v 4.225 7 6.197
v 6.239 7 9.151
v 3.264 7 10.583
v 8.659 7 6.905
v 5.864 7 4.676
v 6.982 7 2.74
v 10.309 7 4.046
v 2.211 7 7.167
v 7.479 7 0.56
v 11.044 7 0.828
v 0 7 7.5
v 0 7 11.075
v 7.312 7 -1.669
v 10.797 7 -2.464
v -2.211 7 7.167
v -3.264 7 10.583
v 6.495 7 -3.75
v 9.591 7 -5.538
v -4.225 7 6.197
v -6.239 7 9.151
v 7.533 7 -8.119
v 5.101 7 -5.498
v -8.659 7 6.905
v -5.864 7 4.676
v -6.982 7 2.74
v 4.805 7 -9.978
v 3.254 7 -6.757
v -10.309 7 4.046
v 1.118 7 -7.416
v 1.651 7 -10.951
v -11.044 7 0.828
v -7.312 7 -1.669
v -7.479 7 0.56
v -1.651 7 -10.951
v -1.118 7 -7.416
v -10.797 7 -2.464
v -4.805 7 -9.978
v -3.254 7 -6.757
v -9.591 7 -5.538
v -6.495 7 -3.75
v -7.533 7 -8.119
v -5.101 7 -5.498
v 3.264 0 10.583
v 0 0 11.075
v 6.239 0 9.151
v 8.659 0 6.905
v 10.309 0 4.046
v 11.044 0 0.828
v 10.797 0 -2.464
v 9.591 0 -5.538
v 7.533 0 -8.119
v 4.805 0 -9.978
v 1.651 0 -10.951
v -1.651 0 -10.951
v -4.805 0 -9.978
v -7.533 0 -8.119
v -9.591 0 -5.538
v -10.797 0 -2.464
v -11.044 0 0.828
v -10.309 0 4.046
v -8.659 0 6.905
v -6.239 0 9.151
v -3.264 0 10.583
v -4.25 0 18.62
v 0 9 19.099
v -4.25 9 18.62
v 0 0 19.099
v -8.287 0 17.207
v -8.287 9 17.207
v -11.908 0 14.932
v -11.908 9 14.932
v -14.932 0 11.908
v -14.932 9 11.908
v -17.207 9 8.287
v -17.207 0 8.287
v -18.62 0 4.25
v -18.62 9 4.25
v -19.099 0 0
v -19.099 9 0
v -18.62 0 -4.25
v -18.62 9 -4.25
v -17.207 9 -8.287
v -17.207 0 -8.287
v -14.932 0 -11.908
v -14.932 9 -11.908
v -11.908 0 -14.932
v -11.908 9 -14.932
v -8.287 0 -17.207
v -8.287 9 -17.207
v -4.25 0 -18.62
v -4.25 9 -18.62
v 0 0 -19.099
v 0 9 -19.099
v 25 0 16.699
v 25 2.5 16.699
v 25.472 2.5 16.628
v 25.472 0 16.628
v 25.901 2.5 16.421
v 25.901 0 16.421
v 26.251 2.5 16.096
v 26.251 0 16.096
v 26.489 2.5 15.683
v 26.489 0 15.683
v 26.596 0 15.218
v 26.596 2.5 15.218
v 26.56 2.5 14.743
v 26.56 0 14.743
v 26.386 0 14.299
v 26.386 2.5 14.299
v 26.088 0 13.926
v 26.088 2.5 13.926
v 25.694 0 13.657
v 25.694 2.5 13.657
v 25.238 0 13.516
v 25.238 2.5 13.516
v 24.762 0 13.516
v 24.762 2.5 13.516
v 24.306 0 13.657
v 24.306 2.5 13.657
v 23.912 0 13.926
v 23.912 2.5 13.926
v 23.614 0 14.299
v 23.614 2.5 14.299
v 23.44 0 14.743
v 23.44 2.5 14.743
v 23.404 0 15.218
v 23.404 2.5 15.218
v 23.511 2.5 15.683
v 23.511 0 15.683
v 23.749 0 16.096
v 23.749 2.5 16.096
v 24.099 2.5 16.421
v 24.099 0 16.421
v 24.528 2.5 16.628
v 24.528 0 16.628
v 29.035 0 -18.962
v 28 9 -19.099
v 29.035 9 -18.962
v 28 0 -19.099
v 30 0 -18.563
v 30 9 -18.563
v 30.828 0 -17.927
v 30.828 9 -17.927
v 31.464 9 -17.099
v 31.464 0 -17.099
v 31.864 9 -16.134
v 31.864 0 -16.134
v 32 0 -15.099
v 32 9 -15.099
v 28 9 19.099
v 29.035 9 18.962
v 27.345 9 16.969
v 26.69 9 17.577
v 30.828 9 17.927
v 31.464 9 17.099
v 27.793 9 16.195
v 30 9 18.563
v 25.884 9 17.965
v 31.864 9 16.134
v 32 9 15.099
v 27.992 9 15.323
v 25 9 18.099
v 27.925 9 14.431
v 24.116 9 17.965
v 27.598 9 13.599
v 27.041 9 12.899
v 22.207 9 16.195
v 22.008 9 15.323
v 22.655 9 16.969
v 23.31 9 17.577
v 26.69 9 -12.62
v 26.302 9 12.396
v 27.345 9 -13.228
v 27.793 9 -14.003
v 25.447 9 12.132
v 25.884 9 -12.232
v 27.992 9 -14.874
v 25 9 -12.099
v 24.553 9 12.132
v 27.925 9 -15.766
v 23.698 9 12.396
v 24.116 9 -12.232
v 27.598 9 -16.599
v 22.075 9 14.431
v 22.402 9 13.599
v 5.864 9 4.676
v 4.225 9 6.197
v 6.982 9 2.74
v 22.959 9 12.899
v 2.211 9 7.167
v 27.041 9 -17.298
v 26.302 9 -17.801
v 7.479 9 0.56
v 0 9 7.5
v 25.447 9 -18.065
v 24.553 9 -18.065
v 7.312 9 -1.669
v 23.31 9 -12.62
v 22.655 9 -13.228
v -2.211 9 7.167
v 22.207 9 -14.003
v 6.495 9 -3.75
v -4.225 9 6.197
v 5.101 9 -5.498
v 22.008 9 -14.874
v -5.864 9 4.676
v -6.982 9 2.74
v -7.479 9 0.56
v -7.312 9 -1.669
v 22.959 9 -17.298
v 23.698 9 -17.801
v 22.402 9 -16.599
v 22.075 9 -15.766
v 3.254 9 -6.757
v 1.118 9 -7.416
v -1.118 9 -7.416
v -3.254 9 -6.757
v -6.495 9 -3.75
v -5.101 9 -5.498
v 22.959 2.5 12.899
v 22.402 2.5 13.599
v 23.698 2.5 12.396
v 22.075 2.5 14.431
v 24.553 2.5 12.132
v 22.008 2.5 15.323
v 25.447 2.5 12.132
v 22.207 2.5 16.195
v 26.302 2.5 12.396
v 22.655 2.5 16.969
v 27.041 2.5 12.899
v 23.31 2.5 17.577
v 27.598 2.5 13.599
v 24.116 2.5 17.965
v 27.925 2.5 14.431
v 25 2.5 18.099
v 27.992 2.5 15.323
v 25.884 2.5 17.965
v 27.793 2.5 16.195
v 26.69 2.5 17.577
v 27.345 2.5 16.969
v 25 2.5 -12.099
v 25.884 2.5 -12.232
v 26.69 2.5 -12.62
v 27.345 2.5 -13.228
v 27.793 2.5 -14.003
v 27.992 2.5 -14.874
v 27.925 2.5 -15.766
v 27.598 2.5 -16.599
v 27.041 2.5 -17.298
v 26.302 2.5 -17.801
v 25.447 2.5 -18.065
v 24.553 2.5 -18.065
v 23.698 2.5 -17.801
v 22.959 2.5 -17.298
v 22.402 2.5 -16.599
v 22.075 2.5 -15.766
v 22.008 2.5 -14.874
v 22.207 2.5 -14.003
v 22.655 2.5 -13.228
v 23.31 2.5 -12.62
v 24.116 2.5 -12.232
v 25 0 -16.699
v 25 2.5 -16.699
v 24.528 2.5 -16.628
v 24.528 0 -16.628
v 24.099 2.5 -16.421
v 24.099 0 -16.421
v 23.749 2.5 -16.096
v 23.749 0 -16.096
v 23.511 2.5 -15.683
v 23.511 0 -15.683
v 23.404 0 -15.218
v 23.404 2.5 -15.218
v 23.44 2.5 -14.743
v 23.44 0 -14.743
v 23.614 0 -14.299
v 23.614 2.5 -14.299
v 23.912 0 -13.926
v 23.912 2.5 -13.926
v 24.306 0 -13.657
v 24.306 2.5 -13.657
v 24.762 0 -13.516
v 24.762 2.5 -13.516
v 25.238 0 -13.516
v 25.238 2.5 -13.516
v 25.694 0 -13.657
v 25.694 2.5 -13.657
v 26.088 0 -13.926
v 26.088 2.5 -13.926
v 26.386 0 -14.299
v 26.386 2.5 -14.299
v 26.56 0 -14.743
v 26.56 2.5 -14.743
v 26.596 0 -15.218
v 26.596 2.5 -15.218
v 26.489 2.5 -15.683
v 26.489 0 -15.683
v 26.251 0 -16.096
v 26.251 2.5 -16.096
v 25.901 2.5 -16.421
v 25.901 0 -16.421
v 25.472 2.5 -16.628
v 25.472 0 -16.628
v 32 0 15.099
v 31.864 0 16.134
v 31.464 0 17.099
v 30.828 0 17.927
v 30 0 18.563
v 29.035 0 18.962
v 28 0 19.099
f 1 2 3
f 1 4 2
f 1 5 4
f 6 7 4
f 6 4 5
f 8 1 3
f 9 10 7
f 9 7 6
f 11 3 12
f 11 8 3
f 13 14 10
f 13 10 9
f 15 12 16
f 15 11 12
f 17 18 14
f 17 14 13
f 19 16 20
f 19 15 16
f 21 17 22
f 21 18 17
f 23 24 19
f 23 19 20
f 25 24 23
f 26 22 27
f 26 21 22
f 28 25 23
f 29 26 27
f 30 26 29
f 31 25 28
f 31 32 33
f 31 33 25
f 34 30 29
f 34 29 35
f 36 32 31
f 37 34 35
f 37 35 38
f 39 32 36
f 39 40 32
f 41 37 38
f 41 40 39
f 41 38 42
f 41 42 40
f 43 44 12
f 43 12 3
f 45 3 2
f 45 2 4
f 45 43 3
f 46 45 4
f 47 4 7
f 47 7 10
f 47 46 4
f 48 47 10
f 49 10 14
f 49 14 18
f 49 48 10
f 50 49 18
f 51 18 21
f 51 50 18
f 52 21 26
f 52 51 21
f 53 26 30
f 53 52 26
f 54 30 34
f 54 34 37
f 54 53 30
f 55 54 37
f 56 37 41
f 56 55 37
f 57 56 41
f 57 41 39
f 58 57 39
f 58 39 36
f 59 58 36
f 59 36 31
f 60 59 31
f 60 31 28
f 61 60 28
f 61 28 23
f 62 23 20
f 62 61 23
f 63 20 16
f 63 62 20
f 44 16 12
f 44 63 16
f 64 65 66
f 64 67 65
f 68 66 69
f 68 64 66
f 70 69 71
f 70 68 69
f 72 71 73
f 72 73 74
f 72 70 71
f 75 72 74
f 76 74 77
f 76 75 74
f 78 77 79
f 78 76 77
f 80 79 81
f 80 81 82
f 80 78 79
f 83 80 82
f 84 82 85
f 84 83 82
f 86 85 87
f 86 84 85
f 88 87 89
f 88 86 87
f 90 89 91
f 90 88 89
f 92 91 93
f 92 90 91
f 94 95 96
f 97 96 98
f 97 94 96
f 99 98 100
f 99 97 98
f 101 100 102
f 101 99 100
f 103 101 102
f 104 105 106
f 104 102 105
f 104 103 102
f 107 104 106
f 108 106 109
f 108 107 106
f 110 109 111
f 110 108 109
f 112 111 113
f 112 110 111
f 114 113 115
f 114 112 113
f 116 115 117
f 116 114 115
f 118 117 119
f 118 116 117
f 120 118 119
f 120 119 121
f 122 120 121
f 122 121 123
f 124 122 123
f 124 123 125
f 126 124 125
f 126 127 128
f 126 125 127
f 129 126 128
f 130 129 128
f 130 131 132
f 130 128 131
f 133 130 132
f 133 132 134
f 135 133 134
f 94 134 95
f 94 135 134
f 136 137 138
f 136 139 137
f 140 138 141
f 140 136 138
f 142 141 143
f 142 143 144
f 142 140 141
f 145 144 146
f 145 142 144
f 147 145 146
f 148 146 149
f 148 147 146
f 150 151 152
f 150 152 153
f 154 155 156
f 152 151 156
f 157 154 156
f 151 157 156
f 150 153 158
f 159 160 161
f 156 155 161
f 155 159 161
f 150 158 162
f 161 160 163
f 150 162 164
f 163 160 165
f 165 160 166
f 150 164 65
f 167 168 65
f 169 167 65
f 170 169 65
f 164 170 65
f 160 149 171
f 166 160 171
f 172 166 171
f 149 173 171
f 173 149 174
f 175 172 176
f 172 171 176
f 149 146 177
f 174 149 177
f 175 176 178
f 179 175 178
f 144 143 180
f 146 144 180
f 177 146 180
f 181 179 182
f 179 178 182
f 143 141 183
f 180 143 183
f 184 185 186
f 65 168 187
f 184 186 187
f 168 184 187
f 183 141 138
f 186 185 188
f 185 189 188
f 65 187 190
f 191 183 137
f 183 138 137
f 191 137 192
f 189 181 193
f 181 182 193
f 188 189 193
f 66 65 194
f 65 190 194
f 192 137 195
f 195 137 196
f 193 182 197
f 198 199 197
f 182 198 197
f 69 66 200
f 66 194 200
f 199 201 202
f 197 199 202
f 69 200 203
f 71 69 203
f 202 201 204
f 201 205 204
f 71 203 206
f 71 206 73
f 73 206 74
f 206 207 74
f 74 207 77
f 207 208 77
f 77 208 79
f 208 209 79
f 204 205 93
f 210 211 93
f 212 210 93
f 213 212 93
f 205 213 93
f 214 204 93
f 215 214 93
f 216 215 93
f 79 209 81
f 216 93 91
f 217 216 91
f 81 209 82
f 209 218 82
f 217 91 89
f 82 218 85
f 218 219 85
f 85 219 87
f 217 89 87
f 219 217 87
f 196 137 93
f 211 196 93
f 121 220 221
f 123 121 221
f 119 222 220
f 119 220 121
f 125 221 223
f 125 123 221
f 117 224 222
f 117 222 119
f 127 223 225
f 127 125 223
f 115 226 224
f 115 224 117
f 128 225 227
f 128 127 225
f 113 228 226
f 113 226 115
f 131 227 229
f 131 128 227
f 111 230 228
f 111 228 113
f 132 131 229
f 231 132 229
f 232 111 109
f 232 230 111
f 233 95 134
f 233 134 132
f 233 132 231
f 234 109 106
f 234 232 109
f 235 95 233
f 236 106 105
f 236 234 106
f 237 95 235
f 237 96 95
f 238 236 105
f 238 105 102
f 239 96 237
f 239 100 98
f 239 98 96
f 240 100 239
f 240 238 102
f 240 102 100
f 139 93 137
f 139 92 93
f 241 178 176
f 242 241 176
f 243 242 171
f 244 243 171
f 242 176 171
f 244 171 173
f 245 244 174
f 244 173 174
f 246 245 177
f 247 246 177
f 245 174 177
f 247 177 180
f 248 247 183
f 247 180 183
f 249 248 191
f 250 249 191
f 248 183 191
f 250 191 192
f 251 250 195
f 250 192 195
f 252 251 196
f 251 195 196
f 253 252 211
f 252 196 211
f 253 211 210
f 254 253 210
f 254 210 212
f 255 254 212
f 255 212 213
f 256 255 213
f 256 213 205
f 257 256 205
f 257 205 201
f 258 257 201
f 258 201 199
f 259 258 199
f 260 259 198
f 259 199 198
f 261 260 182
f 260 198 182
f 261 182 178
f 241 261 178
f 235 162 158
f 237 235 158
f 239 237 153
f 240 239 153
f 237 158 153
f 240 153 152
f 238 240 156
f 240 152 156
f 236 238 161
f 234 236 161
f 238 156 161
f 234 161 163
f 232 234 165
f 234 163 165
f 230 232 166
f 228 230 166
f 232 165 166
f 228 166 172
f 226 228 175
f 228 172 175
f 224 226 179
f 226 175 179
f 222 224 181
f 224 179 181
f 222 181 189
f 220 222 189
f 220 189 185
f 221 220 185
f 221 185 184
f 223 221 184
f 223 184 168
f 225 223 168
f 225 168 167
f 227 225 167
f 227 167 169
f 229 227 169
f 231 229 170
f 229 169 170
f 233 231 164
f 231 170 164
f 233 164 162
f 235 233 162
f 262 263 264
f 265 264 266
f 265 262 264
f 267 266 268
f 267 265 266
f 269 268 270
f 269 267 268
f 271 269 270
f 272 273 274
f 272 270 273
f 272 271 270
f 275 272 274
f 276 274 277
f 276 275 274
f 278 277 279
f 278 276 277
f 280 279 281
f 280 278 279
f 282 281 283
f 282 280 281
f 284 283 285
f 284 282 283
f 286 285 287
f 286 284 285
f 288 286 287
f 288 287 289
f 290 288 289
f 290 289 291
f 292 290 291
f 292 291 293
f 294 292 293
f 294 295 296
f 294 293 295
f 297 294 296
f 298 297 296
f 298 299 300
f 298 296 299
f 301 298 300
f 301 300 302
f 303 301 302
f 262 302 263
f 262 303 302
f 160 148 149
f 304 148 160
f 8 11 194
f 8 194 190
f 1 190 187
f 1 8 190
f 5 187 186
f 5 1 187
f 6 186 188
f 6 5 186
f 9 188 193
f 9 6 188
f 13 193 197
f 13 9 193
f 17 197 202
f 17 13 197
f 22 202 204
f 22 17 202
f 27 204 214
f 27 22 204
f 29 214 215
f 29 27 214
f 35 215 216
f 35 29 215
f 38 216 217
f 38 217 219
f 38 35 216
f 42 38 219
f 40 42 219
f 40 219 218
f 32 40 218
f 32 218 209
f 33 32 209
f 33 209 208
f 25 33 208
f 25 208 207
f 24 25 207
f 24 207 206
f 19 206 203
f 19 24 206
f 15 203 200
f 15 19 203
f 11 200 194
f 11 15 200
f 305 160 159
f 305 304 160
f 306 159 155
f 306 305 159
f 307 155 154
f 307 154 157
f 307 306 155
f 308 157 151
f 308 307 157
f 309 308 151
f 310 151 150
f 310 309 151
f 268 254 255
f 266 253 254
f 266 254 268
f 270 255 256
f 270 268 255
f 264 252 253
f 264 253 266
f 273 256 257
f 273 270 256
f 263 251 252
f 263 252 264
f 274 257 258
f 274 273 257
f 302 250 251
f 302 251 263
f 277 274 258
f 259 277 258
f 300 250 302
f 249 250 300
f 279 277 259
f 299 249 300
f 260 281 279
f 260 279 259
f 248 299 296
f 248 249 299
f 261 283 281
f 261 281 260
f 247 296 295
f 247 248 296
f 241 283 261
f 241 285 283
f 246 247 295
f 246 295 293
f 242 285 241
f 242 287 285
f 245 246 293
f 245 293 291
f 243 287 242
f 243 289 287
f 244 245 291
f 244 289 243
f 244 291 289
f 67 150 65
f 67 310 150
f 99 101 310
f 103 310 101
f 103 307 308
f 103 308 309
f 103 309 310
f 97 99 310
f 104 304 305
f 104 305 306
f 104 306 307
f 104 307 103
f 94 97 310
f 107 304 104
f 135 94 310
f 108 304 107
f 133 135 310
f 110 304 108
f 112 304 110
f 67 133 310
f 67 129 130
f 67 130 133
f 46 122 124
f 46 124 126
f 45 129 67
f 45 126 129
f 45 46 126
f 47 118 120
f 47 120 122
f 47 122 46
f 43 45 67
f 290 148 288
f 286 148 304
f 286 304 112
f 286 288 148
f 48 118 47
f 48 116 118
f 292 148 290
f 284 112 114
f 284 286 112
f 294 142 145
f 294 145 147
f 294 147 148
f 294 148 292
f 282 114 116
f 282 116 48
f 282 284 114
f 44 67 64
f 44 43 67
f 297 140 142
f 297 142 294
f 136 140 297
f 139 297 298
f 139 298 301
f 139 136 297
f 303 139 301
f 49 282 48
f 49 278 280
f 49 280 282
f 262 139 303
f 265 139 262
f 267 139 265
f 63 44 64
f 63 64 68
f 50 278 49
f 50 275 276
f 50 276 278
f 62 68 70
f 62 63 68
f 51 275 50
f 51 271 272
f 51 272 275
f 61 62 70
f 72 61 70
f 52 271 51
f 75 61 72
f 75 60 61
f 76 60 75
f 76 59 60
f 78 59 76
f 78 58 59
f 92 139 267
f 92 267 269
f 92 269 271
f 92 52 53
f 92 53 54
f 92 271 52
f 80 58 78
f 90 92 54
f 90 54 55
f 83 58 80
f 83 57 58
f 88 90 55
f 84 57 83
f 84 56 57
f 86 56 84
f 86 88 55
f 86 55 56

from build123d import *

# Parameters (mm, degrees)
SKIZZE1_R                       = 1.6
SKIZZE1_R_2                     = 11.075
AUFSATZ_LINEAR_AUSTRAGEN1_DEPTH = 7
SKIZZE3_R                       = 7.5
AUFSATZ_LINEAR_AUSTRAGEN2_DEPTH = 2
SKIZZE4_R                       = 3
SCHNITT_LINEAR_AUSTRAGEN1_DEPTH = 6.5
VERRUNDUNG4_R                   = 4


with BuildPart() as part:
    # Skizze1 → Aufsatz-Linear austragen1 (new body)
    with BuildSketch(Plane(origin=(0, 0, 0), x_dir=(1, 0, 0), z_dir=(0, 1, 0))):
        with BuildLine():
            Line((0, 19.098593171), (32, 19.098593171))
            Line((32, 19.098593171), (32, -19.098593171))
            Line((32, -19.098593171), (0, -19.098593171))
            ThreePointArc((0, -19.098593171), (-19.098593171, 0), (0, 19.098593171))
        make_face()
        with Locations(Location((25, -15.098593171, 0), (0, 0, 270))):
            Circle(SKIZZE1_R, mode=Mode.SUBTRACT)
        with Locations(Location((25, 15.098593171, 0), (0, 0, 90))):
            Circle(SKIZZE1_R, mode=Mode.SUBTRACT)
        with Locations(Location((0, 0, 0), (0, 0, 270))):
            Circle(SKIZZE1_R_2, mode=Mode.SUBTRACT)
    extrude(amount=AUFSATZ_LINEAR_AUSTRAGEN1_DEPTH)

    # Skizze3 → Aufsatz-Linear austragen2 (add)
    with BuildSketch(Plane(origin=(0, 7, 0), x_dir=(1, 0, 0), z_dir=(0, 1, 0))):
        with BuildLine():
            Line((0, 19.098593171), (32, 19.098593171))
            Line((32, 19.098593171), (32, -19.098593171))
            Line((32, -19.098593171), (0, -19.098593171))
            ThreePointArc((0, -19.098593171), (-19.098593171, 0), (0, 19.098593171))
        make_face()
        with Locations(Location((0, 0, 0), (0, 0, 270))):
            Circle(SKIZZE3_R, mode=Mode.SUBTRACT)
    extrude(amount=AUFSATZ_LINEAR_AUSTRAGEN2_DEPTH)

    # Skizze4 → Schnitt-Linear austragen1 (cut)
    with BuildSketch(Plane(origin=(0, 9, 0), x_dir=(1, 0, 0), z_dir=(0, 1, 0))):
        with Locations(Location((25, 15.098593171, 0), (0, 0, 270))):
            Circle(SKIZZE4_R)
        with Locations(Location((25, -15.098593171, 0), (0, 0, 270))):
            Circle(SKIZZE4_R)
    extrude(amount=-SCHNITT_LINEAR_AUSTRAGEN1_DEPTH, mode=Mode.SUBTRACT)

    # Verrundung4
    verrundung4_edges = [part.edges().sort_by_distance(p)[0] for p in [
        (32, 4.5, -19.098593171),
        (32, 4.5, 19.098593171),
    ]]
    fillet(verrundung4_edges, radius=VERRUNDUNG4_R)


solid = part.part
